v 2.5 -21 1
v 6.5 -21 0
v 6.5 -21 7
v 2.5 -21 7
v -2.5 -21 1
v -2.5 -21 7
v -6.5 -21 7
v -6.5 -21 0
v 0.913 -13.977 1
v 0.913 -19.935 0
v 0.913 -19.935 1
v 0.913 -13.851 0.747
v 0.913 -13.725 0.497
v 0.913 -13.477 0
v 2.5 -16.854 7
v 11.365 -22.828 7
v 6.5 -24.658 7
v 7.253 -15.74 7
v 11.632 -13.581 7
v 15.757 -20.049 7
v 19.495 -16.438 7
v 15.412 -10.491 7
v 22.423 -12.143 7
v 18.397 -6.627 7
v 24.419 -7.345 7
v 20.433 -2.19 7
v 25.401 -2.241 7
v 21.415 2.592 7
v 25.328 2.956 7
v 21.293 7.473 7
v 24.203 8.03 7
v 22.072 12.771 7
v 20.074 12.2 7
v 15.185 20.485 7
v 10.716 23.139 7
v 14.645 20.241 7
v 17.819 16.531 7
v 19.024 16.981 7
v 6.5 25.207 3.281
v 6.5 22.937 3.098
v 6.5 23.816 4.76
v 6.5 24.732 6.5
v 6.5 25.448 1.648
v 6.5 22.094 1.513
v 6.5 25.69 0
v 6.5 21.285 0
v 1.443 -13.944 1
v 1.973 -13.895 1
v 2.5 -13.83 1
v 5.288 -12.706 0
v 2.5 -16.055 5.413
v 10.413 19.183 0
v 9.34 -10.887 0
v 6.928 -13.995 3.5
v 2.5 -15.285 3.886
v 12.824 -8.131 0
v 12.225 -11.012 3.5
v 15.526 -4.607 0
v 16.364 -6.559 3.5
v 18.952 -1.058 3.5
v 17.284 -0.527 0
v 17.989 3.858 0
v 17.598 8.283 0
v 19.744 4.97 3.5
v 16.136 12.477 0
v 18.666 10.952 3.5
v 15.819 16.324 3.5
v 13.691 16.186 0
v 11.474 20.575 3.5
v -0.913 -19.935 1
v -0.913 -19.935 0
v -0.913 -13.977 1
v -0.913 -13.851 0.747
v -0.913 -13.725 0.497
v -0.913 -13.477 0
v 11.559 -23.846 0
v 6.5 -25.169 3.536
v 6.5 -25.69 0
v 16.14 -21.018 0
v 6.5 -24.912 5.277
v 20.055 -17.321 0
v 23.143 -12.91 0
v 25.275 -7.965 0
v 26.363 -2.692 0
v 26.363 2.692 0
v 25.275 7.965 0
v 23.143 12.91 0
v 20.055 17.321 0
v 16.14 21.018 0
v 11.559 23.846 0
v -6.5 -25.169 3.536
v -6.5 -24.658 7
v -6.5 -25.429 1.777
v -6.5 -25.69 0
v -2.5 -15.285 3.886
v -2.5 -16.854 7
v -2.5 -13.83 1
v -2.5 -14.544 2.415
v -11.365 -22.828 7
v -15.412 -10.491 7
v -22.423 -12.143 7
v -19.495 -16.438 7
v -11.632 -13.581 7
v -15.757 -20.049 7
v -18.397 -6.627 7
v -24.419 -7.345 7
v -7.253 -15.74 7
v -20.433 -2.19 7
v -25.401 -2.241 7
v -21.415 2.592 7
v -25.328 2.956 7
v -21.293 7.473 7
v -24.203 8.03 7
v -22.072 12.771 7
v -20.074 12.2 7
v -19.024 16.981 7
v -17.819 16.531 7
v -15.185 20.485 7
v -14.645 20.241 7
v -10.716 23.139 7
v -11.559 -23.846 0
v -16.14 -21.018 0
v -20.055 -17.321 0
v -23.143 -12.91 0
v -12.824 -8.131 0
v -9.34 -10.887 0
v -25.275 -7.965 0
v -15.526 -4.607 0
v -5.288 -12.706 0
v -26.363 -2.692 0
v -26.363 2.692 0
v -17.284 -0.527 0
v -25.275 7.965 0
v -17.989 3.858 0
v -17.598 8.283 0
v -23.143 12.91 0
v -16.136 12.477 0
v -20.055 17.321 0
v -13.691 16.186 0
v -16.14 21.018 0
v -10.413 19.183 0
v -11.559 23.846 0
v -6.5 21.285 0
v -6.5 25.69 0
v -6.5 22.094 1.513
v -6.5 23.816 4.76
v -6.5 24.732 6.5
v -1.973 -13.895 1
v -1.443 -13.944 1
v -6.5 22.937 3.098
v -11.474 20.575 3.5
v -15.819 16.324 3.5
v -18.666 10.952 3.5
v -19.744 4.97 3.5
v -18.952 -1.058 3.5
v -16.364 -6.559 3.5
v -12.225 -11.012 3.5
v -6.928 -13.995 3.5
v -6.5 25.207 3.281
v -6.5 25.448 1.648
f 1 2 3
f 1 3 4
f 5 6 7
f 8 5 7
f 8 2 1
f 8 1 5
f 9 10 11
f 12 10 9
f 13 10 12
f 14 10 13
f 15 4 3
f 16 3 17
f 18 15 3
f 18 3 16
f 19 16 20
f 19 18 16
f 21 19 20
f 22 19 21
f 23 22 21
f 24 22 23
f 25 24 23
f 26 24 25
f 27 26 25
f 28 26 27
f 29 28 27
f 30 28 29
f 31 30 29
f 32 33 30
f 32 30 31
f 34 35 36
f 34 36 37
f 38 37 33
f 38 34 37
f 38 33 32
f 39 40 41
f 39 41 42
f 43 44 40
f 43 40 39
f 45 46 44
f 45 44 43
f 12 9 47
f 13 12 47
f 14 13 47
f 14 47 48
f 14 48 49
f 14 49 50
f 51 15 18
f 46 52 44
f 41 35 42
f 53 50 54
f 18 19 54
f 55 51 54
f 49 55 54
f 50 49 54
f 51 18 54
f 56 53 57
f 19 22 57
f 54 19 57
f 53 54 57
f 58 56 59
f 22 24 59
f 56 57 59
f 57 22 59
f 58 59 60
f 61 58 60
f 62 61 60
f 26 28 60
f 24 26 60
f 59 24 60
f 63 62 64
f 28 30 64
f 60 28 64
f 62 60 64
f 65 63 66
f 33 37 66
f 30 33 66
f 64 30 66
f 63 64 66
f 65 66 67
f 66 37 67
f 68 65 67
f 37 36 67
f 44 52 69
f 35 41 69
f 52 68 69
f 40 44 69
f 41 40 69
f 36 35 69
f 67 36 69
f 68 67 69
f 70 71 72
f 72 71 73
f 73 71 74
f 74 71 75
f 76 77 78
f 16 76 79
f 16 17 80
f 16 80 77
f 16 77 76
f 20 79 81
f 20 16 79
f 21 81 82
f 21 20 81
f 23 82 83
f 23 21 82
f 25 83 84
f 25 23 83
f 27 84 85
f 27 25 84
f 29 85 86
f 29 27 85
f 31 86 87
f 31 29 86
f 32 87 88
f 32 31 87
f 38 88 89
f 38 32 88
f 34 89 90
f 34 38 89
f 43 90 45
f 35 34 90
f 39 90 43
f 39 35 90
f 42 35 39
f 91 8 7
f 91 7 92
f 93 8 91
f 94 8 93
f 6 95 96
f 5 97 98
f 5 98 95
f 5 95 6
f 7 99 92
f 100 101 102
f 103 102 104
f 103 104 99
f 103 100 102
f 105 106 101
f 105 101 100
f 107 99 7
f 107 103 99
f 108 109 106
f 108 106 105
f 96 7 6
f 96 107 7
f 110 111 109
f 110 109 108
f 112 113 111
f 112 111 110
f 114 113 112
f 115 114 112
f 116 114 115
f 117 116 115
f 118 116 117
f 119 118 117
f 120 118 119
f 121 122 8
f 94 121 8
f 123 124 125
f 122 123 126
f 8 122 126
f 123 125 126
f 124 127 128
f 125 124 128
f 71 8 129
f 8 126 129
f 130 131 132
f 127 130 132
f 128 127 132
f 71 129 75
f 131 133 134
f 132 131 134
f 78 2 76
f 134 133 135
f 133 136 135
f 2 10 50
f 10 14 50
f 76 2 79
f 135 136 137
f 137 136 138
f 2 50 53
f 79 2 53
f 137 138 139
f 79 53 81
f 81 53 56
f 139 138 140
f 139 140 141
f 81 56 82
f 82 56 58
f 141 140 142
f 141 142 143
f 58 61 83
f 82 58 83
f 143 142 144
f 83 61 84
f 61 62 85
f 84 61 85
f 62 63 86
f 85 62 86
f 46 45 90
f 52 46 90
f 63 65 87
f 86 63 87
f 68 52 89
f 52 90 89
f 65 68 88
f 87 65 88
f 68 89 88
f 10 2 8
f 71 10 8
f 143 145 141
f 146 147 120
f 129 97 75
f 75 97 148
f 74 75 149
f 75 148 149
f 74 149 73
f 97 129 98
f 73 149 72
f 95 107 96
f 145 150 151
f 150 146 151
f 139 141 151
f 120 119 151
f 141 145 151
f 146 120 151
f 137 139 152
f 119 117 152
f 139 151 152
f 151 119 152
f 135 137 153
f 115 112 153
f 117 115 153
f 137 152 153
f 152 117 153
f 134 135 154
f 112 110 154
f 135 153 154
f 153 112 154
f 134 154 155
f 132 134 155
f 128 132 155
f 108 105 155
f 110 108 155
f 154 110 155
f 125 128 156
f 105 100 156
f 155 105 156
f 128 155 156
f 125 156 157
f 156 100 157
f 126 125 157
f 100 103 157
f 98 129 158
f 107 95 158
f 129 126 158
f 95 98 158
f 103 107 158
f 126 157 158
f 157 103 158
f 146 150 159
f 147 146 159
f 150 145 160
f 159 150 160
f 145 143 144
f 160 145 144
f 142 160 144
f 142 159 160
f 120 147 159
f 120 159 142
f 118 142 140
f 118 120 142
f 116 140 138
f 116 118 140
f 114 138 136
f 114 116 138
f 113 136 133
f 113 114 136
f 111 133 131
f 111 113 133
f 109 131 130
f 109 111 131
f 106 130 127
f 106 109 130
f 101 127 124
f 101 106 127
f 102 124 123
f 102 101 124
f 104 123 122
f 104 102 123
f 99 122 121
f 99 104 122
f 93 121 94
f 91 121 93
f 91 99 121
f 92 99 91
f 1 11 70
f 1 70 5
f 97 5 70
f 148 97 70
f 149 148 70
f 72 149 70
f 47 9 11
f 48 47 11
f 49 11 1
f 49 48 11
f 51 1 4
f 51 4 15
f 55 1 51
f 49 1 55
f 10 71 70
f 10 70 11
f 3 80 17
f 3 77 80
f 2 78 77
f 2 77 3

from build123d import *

# Parameters (mm, degrees)
F0_R      = 26.5
F2_R      = 25.5
F4_R      = 18
F3_R      = 21.5
F7_W      = 13
F7_H      = 32.7027017848
F8_DEPTH  = 25
F9_START  = 1
F9_DEPTH  = 24
F7_W_2    = 1.8262825906
F7_H_2    = 8.4616364911
F10_DEPTH = 25


with BuildPart() as f5:
    # F0 (on Top) → F5 section 0
    with BuildSketch(Plane.XY):
        Circle(F0_R)
    # F2 (on offset) → F5 section 1
    with BuildSketch(Plane.XY.offset(7)):
        Circle(F2_R)
    loft()

    # F4 (on Top) → F6 section 0
    with BuildSketch(Plane.XY):
        with Locations((0, 4.5)):
            Circle(F4_R)
    # F3 (on offset) → F6 section 1
    with BuildSketch(Plane.XY.offset(7)):
        with Locations((0, 4.5)):
            Circle(F3_R)
    loft(mode=Mode.SUBTRACT)

    # F7 (on Top) → F8 (cut)
    with BuildSketch(Plane.XY):
        with Locations((0, 16.3513508924)):
            Rectangle(F7_W, F7_H)
        Polygon((-6.5, -21), (-6.5, -30), (6.5, -30), (6.5, -21), (2.5, -21), (-2.5, -21), align=None)
    extrude(amount=F8_DEPTH, mode=Mode.SUBTRACT)

    # F7 (on Top) → F9 (cut)
    with BuildSketch(Plane.XY.offset(F9_START)):
        Polygon((-2.5, -11.4733194932), (-2.5, -21), (2.5, -21), (2.5, -11.4733194932), (0.9131412953, -11.4733194932), (0.9131412953, -19.9349559844), (-0.9131412953, -19.9349559844), (-0.9131412953, -11.4733194932), align=None)
    extrude(amount=F9_DEPTH, mode=Mode.SUBTRACT)

    # F7 (on Top) → F10 (cut)
    with BuildSketch(Plane.XY):
        with Locations((0, -15.7041377388)):
            Rectangle(F7_W_2, F7_H_2)
    extrude(amount=F10_DEPTH, mode=Mode.SUBTRACT)


solid = f5.part
